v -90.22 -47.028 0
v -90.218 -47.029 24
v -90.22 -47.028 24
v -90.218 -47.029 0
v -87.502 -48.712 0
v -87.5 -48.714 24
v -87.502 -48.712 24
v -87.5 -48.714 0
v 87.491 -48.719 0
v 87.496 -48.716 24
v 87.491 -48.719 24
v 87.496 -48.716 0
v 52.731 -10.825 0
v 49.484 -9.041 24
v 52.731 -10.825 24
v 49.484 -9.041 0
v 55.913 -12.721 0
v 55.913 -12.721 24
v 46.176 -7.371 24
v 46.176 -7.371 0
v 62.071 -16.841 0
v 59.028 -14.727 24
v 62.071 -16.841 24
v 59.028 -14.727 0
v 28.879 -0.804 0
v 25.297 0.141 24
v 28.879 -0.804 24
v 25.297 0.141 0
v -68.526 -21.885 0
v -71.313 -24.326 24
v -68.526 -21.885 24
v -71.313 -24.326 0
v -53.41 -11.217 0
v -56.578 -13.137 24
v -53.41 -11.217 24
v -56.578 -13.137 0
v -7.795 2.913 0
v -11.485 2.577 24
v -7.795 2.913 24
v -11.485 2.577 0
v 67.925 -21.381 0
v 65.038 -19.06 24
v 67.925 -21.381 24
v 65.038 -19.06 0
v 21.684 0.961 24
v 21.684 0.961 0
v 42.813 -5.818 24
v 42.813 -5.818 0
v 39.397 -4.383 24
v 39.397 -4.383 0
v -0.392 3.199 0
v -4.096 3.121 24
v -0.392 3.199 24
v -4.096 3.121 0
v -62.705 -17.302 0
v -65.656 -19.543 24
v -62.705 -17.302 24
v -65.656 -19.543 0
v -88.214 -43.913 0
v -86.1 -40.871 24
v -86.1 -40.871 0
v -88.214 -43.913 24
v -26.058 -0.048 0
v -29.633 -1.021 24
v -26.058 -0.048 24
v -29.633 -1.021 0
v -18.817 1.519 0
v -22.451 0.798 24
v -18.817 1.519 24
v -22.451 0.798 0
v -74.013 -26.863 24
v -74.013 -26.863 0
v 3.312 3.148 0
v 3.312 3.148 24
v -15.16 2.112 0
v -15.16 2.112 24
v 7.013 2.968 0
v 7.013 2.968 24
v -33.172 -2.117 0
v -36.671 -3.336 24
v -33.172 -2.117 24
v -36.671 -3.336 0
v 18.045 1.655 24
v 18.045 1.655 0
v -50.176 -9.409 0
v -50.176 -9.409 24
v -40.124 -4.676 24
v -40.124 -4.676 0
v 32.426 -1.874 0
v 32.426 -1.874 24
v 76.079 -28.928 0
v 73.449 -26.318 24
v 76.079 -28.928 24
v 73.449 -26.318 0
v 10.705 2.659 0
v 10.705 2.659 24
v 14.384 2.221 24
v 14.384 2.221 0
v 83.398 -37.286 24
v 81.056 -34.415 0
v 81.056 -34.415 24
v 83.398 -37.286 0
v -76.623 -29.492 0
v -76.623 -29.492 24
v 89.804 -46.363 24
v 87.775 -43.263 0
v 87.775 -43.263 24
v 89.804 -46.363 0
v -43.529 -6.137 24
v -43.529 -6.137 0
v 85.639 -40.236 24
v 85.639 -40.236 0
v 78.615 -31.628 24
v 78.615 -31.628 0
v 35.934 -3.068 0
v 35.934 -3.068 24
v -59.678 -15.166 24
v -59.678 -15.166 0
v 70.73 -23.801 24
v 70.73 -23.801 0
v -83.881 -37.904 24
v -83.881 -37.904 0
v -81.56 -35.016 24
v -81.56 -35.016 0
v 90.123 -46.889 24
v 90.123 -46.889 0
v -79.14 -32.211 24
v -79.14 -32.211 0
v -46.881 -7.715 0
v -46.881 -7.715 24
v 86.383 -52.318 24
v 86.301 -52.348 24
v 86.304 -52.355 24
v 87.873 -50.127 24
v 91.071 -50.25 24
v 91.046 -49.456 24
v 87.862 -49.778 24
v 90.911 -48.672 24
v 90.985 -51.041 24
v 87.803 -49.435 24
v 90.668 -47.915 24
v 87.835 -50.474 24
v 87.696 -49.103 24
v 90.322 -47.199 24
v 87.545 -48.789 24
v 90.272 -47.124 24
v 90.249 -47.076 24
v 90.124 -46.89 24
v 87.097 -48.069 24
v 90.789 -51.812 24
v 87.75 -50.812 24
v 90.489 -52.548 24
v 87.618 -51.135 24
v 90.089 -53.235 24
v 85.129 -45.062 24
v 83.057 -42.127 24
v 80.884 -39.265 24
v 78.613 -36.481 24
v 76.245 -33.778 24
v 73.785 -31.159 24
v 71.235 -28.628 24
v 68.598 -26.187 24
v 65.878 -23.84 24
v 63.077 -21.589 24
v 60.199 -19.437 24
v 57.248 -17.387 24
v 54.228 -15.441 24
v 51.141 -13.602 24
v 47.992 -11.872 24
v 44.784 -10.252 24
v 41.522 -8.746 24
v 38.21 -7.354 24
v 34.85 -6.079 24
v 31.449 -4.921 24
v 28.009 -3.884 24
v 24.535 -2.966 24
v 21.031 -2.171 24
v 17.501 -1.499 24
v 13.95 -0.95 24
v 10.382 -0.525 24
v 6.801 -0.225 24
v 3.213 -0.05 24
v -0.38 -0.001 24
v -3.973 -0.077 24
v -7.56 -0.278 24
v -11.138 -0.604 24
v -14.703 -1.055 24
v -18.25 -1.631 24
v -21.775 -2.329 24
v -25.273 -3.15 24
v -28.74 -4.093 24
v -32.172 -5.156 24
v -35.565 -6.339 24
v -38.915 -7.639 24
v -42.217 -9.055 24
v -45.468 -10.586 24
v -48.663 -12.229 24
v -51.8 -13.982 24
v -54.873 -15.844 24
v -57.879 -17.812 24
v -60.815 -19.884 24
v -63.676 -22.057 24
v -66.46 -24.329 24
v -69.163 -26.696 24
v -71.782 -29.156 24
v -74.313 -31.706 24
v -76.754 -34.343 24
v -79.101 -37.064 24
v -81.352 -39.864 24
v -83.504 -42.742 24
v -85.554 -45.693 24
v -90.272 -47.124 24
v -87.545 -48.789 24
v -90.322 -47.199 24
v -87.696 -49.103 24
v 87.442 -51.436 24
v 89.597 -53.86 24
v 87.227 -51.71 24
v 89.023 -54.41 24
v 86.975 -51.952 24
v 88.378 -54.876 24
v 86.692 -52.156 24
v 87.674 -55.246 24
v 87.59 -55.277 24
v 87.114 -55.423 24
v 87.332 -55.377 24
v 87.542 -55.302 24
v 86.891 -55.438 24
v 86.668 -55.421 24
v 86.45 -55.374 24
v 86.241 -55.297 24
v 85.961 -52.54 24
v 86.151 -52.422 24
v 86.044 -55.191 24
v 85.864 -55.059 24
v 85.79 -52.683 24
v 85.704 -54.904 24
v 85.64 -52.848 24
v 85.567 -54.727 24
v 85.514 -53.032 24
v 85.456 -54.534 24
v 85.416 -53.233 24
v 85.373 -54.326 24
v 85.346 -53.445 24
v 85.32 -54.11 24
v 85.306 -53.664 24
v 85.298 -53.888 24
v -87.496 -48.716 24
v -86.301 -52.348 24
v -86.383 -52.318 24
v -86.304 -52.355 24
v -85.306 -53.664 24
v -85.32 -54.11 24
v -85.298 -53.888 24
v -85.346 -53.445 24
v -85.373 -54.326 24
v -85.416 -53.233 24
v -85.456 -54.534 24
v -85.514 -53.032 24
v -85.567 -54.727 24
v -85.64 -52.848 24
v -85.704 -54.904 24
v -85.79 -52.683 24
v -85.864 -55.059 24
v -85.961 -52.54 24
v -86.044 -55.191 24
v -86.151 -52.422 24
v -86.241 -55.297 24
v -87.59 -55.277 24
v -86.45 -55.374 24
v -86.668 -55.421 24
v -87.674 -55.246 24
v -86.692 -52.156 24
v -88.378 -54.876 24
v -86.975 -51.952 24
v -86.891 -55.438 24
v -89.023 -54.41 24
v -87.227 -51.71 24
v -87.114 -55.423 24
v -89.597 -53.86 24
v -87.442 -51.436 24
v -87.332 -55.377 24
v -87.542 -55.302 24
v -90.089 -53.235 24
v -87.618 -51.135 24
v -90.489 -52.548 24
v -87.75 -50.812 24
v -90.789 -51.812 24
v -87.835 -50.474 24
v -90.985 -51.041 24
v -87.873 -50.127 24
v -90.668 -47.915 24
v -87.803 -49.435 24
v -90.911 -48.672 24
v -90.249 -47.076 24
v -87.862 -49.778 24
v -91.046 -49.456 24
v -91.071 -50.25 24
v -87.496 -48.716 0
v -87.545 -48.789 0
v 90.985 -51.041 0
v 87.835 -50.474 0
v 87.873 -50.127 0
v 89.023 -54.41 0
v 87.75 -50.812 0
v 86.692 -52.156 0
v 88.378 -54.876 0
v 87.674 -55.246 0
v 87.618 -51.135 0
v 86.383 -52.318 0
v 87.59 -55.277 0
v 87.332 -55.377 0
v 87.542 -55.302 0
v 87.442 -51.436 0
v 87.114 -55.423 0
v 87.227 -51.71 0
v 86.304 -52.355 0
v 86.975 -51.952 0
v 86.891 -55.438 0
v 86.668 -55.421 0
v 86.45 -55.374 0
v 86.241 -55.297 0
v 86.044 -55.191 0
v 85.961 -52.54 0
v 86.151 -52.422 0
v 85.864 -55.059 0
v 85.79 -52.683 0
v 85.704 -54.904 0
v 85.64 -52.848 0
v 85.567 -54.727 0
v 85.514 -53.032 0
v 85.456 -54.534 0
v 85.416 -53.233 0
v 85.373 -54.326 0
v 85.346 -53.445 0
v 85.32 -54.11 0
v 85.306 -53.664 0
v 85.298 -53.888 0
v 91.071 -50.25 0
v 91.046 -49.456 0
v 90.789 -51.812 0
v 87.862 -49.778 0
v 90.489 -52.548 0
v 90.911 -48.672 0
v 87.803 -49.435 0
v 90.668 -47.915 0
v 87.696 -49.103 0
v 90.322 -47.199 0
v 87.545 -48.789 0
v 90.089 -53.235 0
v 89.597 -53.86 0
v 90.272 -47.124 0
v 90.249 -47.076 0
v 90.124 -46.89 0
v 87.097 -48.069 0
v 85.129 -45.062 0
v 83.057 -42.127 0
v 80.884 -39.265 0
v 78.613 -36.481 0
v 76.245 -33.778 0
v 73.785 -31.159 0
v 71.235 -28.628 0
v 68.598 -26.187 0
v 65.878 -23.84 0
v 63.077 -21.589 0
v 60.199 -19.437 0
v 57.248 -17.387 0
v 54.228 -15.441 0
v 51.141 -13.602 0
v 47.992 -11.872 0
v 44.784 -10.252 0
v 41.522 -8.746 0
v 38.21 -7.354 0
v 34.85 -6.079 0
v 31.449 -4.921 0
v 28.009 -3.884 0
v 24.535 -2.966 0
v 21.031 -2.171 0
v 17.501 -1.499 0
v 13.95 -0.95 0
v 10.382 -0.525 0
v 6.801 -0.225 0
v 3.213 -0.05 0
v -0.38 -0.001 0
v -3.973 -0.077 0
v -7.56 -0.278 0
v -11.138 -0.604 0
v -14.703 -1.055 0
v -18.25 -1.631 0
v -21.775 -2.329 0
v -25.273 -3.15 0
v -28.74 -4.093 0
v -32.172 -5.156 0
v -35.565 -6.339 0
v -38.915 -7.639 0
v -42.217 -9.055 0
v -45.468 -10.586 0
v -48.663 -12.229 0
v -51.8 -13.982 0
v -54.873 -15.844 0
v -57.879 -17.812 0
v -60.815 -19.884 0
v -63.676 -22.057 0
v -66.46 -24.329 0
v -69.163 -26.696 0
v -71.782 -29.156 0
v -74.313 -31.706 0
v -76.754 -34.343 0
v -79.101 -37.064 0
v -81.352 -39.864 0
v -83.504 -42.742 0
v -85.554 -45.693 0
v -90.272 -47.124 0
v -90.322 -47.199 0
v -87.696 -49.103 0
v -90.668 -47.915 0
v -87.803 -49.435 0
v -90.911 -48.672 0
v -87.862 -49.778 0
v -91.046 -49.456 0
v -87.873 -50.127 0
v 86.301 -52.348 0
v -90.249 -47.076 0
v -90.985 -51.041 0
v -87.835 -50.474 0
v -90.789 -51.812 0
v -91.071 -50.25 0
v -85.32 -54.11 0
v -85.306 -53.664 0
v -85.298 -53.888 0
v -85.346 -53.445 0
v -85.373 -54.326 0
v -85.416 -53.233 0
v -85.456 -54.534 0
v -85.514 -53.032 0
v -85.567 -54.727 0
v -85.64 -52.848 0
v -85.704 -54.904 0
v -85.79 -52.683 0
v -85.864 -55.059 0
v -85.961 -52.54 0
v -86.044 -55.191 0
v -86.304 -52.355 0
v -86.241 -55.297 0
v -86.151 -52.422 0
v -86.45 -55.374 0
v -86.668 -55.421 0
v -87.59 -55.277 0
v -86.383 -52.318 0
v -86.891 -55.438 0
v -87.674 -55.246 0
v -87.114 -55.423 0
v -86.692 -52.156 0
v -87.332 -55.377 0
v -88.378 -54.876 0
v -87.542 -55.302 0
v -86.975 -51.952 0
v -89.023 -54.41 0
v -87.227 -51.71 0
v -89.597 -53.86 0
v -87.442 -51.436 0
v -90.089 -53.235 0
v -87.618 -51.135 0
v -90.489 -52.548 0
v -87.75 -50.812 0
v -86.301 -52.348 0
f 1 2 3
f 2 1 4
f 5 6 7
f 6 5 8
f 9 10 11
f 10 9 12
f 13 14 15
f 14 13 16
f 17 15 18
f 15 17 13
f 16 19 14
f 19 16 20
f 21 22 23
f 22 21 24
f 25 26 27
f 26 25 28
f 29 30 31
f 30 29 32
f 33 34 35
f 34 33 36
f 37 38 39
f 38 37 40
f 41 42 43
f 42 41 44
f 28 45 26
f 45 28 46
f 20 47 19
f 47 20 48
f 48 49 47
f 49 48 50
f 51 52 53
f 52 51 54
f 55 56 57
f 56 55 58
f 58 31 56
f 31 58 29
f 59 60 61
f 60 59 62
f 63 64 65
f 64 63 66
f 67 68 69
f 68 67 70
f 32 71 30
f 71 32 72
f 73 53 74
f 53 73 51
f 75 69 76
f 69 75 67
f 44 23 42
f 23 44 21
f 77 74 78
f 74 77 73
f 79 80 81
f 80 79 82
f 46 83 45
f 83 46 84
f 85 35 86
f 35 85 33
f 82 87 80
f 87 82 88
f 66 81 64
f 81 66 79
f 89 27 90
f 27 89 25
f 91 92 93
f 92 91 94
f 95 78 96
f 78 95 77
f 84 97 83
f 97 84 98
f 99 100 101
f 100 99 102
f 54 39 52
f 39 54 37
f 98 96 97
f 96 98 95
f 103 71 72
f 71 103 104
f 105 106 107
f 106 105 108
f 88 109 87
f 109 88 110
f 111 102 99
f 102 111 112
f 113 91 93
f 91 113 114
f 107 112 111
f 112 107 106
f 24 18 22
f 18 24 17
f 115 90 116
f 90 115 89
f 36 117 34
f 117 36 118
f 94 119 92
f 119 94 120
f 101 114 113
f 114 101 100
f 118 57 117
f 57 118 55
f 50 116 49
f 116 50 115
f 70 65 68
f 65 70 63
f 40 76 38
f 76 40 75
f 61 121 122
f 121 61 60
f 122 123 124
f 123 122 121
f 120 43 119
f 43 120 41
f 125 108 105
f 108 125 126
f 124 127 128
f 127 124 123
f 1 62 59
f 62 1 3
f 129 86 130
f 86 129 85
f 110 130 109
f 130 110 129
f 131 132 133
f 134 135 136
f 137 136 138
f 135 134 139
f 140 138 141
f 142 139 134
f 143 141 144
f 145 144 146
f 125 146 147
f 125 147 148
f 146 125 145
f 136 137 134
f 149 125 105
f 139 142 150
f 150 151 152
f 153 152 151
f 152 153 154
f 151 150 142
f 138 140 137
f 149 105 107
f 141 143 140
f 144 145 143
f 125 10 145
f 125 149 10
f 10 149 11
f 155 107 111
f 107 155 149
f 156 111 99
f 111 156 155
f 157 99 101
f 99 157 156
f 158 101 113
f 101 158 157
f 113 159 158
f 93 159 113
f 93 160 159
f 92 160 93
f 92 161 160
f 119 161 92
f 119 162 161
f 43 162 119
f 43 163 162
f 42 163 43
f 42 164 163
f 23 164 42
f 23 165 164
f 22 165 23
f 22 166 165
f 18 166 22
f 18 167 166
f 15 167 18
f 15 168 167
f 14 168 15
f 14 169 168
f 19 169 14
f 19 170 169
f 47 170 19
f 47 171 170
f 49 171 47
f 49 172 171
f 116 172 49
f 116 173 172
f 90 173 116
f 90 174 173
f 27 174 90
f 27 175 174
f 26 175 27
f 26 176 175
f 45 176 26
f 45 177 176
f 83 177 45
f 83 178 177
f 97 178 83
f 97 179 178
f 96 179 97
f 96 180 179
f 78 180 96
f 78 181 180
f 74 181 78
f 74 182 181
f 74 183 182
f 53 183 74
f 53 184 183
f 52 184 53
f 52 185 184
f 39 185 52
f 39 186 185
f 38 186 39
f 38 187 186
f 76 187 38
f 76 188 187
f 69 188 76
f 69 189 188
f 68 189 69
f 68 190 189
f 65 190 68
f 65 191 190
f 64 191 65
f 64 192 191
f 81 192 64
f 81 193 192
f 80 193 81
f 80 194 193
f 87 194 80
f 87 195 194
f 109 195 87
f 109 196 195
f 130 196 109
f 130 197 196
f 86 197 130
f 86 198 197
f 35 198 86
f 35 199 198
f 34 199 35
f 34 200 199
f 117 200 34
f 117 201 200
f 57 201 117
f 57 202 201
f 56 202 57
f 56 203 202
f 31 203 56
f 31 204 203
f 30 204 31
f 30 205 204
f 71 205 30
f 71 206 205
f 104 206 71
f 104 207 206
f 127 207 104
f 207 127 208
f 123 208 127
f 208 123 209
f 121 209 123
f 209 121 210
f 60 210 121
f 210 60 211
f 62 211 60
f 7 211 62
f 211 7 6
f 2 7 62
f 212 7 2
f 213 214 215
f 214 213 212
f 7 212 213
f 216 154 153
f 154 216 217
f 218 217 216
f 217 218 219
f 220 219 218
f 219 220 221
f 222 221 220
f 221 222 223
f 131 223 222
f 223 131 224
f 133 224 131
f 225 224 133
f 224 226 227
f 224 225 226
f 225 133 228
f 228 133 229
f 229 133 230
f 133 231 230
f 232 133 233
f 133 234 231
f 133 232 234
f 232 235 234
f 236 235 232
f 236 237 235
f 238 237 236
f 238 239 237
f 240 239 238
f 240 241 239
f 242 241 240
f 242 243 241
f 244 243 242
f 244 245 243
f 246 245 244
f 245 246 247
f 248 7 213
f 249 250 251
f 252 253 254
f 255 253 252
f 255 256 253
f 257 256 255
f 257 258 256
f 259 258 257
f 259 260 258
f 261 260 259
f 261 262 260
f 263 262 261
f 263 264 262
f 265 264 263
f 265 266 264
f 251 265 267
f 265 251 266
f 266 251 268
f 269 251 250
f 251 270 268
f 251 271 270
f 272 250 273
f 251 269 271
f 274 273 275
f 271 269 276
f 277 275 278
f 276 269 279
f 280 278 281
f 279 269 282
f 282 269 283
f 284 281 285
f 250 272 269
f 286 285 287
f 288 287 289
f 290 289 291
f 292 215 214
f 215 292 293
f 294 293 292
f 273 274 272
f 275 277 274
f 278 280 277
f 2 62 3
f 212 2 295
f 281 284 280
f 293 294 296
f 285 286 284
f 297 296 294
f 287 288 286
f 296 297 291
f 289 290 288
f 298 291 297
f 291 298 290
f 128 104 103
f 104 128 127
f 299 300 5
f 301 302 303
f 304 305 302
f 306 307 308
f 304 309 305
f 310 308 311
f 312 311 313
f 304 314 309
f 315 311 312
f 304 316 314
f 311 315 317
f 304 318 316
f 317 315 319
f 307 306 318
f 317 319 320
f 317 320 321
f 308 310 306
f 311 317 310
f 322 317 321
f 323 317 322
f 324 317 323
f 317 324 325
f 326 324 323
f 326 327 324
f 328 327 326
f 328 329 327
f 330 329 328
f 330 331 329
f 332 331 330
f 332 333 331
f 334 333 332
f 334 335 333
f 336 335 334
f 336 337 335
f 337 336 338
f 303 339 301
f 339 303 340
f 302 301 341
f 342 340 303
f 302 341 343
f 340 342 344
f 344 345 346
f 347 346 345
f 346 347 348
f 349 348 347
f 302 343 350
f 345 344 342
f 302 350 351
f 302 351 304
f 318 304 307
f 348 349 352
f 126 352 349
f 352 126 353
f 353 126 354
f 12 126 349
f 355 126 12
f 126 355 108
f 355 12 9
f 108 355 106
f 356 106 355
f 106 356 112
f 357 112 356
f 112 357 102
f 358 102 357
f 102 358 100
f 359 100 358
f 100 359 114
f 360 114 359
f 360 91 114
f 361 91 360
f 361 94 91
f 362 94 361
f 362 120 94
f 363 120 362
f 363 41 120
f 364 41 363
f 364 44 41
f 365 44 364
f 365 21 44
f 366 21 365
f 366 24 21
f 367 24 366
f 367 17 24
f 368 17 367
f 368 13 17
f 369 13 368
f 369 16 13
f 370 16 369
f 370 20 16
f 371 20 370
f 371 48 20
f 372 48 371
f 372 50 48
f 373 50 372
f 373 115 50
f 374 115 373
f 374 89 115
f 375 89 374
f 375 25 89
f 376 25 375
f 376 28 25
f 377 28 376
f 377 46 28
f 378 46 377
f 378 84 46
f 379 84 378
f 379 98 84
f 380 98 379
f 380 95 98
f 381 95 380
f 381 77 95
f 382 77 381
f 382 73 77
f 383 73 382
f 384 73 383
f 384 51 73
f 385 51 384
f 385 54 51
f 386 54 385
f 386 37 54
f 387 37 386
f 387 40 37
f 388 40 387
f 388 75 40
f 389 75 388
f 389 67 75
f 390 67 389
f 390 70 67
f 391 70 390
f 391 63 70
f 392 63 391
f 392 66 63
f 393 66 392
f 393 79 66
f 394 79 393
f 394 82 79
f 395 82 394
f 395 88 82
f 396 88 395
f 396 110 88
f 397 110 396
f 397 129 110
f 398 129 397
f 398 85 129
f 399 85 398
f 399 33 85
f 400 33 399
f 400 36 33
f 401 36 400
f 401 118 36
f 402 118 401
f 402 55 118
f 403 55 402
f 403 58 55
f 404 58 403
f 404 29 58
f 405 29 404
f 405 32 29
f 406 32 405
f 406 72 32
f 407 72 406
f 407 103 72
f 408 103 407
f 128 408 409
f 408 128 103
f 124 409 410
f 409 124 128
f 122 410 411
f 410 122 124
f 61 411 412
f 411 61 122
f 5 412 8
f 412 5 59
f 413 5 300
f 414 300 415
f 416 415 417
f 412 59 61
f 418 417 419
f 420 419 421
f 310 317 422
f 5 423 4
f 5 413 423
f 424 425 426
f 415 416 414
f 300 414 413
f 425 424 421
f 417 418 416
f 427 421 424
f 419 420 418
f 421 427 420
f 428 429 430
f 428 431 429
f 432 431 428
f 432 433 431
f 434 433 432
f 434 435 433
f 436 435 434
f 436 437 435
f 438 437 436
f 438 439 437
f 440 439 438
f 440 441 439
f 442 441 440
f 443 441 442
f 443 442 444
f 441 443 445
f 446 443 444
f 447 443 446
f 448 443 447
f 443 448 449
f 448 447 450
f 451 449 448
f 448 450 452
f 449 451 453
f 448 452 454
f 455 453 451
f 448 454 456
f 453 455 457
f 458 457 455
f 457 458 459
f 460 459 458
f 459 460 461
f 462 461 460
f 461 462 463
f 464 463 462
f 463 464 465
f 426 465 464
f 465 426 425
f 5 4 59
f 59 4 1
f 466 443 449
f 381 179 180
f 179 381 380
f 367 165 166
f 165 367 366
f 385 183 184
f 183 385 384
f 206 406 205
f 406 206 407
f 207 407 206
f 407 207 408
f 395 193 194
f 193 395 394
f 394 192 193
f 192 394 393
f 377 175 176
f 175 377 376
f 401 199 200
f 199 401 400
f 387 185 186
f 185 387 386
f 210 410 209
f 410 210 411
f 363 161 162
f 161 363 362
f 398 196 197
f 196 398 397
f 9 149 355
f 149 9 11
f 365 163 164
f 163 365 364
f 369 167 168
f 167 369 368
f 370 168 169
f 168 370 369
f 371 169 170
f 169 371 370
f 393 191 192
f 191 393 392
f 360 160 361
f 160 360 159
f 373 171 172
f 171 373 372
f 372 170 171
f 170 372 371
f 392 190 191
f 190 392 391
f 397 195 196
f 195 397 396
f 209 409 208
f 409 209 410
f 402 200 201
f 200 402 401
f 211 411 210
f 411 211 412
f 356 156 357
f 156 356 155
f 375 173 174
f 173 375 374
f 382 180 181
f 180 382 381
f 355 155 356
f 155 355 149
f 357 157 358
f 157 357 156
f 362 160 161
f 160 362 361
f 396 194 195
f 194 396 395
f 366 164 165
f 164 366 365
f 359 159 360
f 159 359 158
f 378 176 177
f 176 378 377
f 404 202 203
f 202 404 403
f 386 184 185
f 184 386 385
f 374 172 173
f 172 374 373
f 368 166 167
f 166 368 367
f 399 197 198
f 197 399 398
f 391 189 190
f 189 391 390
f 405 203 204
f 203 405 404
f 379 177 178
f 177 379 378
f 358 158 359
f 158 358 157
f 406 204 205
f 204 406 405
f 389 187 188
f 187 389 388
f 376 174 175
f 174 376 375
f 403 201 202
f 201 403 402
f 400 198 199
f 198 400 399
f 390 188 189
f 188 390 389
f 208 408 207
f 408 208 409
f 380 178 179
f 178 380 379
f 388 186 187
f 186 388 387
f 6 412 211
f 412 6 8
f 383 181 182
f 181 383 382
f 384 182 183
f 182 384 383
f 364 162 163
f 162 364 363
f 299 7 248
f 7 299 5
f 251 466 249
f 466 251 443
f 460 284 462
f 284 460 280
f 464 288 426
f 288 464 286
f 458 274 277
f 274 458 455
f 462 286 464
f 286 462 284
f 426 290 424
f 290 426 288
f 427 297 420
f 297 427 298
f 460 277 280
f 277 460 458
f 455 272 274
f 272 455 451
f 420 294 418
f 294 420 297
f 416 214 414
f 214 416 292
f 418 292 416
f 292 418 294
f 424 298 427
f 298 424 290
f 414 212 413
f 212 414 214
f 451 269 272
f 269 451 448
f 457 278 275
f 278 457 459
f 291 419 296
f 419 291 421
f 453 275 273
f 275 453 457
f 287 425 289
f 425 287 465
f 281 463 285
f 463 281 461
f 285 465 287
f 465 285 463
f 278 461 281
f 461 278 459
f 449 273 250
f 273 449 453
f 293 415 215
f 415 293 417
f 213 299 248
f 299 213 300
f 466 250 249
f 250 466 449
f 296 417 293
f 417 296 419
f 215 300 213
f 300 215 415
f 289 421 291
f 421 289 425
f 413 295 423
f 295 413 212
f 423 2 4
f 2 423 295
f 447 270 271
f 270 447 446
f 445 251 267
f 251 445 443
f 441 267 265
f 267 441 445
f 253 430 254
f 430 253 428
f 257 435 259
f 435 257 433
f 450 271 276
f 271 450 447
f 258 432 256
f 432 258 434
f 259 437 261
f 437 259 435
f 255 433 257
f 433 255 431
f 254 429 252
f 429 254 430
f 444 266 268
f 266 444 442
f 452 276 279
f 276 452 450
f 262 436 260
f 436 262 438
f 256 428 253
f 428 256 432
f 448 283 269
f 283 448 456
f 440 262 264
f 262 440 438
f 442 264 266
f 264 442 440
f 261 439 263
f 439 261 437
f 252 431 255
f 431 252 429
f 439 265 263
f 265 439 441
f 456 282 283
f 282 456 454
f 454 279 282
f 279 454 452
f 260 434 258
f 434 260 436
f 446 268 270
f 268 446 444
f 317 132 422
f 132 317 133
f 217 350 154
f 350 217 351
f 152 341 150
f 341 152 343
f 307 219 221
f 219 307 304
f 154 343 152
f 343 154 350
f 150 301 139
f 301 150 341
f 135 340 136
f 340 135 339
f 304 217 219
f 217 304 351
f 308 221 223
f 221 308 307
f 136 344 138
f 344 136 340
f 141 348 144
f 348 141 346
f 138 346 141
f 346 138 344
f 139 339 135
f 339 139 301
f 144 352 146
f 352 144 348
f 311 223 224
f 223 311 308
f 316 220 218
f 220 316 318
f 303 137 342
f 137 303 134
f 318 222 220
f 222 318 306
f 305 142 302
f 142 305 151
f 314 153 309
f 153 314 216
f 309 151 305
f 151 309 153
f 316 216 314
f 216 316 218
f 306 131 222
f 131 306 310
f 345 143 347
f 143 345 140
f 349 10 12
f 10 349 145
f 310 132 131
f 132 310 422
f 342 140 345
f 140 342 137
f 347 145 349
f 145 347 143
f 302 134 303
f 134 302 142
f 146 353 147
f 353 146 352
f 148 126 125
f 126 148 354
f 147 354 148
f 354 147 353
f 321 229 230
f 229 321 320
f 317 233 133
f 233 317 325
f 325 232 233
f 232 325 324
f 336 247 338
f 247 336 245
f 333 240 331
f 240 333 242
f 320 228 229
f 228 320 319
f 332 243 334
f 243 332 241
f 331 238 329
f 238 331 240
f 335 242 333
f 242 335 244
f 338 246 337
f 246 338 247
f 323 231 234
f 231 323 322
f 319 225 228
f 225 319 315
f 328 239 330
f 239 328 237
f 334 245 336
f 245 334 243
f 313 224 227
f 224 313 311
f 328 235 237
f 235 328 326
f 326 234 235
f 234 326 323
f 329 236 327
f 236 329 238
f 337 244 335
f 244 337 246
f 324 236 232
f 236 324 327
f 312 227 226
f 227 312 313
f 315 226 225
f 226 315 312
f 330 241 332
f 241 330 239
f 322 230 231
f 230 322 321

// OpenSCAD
// Length of the stand
_length = 175.0;

// height of the stand
_height = 24.0;

// Curvature of the stand (lower values for a flatter arc, 100 for a semicircle)
_curvature = 85; //[50:100]

// Thickness of the stand
_thickness = 0.4*8;

// Radius at the ends where it clips to the device
_clip_radius = 2.5;

// How far around the device the clips run
_clip_angle = 100; //[60:180]



////////////////////////////////////////////////////////////////////////



// only works from [0 to 180] degrees, runs clockwise from 12 o'clock
module smallArc(radius0, radius1, angle, depth) {
	thickness = radius1 - radius0;
	eps = 0.1;

	union() {
		difference() {
			// full arc
			cylinder(r=radius1, h=depth, center=true);
			cylinder(r=radius0, h=depth+2*eps, center=true);

			for(z=[0, 180 - angle]) {
				rotate([0,0,z])
				translate([-radius1,0,0])			
				cube(size = [radius1*2, radius1*2, depth+eps], center=true);
			}
		}
	}
}



// arc from [0 to 360] degrees with rounded ends, runs clockwise from 12 o'clock, rounded tips not included in angle computation
module roundArc(radius0, radius1, angle, depth) {
	thickness = radius1 - radius0;
	cutAngle = 360-angle;
	centerRadius = (radius0 + radius1)/2.0;
	union() {
		if (angle > 180) {
			smallArc(radius0, radius1, 180, depth);
			rotate([0,0,-180]) {
				smallArc(radius0, radius1, angle-180, depth);
			}
		} else {
			smallArc(radius0, radius1, angle, depth);
		}

		// round ends
		for(t = [ [0,centerRadius,0], 
					 [centerRadius * -sin(cutAngle), centerRadius * cos(cutAngle),0] ]) {
			translate(t) {
				cylinder(r=thickness/2, h=depth, center=true);
			}
		}
	}
}

module makeStand(arcRadius, angle, height, outerThickness, clipRadius, clipAngle) {
	ir = arcRadius;
	or = ir + outerThickness;
	cx = (ir-clipRadius)*sin(angle/2);
	cy = (ir-clipRadius)*cos(angle/2);

	union() {

		//	spine
		rotate([0,0,angle/2]) {
			smallArc(ir, or, angle, height, $fn=180);
		}

		// clip
		for (m=[1,0]) {
			mirror([m,0,0]) {
				translate([cx, cy, 0])
				rotate([0,0,-angle/2]) {
					roundArc(clipRadius, clipRadius+outerThickness, clipAngle, height, $fn=45);
				}
			}
		}
	}
}

module make() {
	radius = _length / (2 *(_curvature/100));
	angle = 2 * asin(_length/(2*radius));

	translate([0,-radius,_height/2]) {
			makeStand(radius, 
					  angle, 
					  _height, 
					  _thickness, 
					  _clip_radius,
					  _clip_angle);
		}
}

make();
